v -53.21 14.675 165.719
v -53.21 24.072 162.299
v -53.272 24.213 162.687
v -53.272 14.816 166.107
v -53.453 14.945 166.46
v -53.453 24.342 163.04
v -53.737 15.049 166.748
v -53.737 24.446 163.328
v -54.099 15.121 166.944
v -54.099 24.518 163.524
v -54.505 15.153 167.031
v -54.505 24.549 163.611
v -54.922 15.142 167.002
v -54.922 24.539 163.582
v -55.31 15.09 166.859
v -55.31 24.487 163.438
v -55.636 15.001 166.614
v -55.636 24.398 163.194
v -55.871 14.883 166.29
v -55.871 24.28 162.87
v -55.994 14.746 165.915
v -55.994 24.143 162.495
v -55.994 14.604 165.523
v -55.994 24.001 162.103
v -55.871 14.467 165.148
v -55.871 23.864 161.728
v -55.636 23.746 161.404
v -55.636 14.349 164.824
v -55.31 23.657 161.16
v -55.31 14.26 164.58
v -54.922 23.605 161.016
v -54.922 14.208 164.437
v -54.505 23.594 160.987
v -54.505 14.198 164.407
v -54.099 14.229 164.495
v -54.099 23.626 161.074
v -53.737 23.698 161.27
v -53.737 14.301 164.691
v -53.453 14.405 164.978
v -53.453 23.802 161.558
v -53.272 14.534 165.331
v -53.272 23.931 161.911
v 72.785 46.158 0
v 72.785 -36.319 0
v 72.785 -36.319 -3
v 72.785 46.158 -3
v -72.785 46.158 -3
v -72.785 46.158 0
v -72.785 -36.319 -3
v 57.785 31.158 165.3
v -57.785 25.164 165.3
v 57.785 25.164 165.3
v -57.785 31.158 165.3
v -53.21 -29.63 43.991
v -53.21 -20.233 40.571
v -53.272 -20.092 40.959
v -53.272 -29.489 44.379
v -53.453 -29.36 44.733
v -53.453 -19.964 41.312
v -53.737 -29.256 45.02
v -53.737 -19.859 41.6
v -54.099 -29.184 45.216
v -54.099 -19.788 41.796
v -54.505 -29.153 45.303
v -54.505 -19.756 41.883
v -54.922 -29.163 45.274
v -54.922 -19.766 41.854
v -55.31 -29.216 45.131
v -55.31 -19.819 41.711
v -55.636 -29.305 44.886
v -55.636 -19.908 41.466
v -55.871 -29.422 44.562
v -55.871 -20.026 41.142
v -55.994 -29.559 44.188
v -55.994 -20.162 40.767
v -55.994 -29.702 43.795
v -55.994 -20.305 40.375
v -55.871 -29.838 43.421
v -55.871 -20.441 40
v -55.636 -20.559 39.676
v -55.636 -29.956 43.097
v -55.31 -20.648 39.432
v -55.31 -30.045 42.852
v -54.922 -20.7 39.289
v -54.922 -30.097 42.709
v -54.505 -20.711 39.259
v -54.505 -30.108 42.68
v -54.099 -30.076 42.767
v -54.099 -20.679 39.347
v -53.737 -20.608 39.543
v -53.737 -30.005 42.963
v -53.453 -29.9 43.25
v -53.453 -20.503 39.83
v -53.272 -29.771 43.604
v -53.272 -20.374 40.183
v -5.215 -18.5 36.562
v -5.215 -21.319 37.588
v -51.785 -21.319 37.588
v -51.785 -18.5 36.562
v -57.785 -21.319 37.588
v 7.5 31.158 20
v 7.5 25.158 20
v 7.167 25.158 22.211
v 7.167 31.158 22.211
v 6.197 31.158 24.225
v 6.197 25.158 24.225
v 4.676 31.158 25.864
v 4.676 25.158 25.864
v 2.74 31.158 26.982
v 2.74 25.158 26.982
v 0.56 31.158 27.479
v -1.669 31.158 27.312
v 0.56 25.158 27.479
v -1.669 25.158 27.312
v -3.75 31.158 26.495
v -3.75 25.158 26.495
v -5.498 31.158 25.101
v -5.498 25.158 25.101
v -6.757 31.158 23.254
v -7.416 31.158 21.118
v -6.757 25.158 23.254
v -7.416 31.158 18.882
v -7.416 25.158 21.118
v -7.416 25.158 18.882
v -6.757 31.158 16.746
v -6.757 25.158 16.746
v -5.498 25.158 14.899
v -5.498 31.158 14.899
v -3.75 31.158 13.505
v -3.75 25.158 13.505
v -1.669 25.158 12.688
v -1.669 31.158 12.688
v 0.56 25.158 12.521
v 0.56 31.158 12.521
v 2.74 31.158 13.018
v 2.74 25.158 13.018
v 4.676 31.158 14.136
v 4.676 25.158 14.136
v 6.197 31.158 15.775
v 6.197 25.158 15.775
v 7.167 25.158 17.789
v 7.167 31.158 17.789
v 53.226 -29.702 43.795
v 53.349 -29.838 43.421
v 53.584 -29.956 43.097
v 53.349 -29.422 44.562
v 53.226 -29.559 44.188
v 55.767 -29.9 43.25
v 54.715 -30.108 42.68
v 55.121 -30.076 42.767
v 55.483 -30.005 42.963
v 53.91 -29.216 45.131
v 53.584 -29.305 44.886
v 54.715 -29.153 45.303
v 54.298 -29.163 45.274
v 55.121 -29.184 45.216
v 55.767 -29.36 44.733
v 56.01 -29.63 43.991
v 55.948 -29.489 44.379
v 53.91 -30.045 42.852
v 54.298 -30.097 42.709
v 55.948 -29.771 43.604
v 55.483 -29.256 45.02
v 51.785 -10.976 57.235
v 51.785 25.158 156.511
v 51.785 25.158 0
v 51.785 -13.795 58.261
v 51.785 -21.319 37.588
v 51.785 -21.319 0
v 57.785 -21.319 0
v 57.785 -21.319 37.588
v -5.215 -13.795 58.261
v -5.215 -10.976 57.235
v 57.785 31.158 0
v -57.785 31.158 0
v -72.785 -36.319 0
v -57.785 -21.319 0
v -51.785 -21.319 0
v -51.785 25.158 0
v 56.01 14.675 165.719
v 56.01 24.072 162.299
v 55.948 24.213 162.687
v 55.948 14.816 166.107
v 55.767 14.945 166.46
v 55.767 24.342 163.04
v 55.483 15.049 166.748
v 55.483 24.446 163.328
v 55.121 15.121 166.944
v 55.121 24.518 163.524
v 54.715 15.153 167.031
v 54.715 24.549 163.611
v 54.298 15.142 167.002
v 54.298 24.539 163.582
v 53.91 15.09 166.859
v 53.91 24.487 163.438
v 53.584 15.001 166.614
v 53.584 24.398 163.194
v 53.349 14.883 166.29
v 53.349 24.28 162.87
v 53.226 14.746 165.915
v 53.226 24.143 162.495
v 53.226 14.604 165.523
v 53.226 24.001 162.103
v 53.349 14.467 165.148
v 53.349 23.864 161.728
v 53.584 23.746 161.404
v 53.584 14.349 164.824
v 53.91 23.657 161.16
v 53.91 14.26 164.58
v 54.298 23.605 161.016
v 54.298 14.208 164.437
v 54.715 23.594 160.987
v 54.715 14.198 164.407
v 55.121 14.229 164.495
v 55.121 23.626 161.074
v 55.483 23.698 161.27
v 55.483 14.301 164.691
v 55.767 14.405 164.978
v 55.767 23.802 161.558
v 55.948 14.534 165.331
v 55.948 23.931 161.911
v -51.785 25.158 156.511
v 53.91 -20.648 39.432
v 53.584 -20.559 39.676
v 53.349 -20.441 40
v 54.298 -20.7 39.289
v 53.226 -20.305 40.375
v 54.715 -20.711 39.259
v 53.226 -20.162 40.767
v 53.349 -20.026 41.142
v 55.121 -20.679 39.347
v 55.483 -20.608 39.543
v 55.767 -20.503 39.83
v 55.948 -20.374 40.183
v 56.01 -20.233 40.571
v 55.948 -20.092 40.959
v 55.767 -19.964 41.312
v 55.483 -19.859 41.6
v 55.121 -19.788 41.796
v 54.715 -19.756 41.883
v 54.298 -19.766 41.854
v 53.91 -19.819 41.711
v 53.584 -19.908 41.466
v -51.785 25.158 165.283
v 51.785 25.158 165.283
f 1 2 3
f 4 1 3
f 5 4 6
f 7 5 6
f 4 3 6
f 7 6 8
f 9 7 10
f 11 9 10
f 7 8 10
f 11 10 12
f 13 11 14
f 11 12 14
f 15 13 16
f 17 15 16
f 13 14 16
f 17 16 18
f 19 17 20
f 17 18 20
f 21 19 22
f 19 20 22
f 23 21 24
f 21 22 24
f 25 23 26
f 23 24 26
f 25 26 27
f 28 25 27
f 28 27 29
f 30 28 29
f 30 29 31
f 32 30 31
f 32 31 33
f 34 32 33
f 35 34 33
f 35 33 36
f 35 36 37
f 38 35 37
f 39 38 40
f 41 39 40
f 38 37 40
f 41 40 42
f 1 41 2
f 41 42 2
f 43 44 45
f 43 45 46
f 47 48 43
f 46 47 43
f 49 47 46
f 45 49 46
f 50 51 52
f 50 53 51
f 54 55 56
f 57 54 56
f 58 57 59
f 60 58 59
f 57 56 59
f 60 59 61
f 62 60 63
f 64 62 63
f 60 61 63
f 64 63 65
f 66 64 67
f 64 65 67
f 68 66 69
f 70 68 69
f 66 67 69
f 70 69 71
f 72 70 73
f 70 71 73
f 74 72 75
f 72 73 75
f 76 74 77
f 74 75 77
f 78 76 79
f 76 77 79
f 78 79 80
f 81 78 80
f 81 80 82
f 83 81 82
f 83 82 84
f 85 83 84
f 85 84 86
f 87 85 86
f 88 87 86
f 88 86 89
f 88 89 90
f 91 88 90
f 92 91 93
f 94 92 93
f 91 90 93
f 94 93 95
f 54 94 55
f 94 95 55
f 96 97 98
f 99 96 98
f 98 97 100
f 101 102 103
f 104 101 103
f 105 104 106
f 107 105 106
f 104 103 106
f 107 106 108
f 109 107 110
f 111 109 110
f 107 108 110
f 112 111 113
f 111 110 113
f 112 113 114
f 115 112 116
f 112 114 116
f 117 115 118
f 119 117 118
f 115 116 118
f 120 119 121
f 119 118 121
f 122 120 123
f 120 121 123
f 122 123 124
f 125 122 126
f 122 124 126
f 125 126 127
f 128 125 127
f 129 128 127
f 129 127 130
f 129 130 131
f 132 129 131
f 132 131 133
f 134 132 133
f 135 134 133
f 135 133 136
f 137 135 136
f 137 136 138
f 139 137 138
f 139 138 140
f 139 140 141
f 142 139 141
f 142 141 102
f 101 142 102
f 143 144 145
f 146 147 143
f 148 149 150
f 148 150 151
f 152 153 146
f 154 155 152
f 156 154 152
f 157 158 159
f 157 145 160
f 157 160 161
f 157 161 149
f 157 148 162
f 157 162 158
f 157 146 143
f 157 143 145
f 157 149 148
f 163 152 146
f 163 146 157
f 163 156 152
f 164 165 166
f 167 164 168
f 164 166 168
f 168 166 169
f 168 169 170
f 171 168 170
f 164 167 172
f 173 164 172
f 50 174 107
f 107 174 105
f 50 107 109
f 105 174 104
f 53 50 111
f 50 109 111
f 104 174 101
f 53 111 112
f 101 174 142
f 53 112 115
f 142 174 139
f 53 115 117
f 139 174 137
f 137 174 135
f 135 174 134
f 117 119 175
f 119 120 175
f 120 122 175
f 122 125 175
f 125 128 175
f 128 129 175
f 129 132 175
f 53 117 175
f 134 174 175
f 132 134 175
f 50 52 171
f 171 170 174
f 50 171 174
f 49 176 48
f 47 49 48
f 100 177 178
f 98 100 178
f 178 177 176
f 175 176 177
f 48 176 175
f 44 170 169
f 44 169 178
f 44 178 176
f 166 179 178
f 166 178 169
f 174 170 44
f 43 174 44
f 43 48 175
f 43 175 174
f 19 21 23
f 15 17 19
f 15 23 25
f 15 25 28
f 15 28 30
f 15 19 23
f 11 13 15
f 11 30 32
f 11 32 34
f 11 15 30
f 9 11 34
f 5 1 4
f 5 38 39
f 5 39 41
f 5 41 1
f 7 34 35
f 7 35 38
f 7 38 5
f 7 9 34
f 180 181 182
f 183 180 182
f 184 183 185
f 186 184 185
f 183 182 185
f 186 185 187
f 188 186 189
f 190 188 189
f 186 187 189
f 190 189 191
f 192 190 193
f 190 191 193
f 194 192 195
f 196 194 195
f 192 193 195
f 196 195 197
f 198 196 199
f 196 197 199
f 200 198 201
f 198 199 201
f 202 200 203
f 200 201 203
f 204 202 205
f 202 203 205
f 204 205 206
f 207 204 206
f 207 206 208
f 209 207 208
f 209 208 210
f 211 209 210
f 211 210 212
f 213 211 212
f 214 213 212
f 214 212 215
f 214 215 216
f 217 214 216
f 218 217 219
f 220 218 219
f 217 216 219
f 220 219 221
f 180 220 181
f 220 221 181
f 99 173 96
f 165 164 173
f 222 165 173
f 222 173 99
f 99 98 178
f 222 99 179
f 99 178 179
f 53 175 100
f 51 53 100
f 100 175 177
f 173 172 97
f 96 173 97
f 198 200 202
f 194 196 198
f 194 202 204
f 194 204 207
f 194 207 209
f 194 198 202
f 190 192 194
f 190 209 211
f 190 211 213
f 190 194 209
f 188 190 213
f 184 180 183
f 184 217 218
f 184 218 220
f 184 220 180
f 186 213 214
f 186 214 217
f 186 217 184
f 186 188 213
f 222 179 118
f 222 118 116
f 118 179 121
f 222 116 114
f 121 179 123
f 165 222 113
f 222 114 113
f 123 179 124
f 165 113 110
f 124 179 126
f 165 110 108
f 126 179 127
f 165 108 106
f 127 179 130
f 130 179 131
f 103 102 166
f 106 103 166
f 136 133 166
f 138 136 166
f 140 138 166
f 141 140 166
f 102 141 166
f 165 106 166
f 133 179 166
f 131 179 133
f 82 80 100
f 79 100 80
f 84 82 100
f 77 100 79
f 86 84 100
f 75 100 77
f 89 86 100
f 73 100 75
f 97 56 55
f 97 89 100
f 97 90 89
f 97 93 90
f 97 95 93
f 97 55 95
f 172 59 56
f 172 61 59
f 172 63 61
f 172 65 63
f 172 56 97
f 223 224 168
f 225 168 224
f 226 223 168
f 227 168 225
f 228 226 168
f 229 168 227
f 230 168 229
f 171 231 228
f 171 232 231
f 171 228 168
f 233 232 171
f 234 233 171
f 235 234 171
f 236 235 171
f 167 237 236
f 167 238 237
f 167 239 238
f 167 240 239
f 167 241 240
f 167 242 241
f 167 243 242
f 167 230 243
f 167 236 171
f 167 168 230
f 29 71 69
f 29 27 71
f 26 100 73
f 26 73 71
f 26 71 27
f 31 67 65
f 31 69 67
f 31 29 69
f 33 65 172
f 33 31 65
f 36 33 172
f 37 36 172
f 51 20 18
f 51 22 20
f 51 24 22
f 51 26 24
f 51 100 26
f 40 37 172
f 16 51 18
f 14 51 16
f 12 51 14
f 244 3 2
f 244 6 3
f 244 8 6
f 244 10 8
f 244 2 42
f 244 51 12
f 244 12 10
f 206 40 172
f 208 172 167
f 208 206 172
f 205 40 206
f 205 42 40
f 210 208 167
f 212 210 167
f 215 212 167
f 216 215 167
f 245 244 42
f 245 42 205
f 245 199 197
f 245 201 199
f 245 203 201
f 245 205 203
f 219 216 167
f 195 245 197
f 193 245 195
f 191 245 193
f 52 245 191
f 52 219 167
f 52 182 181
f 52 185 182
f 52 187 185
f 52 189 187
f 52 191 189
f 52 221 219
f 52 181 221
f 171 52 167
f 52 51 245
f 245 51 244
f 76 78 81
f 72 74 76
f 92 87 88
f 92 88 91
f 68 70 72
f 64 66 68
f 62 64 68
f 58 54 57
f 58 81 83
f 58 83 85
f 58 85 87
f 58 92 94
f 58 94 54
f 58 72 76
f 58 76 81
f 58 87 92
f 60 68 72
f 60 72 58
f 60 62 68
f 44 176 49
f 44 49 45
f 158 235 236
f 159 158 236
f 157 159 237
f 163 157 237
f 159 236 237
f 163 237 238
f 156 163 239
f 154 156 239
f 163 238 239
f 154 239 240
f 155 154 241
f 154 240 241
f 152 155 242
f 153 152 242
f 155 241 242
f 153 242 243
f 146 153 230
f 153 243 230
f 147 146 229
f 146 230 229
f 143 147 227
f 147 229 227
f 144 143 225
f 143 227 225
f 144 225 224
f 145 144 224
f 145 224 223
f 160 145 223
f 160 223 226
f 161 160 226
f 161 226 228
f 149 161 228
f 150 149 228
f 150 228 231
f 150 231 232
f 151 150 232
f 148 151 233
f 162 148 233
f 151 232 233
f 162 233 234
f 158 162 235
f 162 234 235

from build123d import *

# Parameters (mm, degrees)
SKETCH001_W     = 145.57
SKETCH001_H     = 82.477117
PAD_DEPTH       = 3
PAD001_DEPTH    = 165.3
SKETCH004_W     = 328.820023
SKETCH004_H     = 275.658927
POCKET_DEPTH    = 200
PAD002_DEPTH    = 3
SKETCH003_R     = 1.4
PAD003_DEPTH    = 10
SKETCH005_R     = 7.5
POCKET001_DEPTH = 46.158923


with BuildPart() as part:
    # Sketch001 → Pad (new body)
    with BuildSketch(Plane.XY):
        with Locations((0, 4.919365)):
            Rectangle(SKETCH001_W, SKETCH001_H)
    extrude(amount=-PAD_DEPTH)

    # Sketch → Pad001 (join)
    with BuildSketch(Plane.XY):
        Polygon((51.785, -21.319194), (57.785, -21.319194), (57.785, 31.157923), (-57.785, 31.157923), (-57.785, -21.319194), (-51.785, -21.319194), (-51.785, 25.157923), (51.785, 25.157923), align=None)
    extrude(amount=PAD001_DEPTH)

    # Sketch004 (on DatumPlane) → Pocket (cut)
    with BuildSketch(Plane(origin=(0, -35, 0), x_dir=(1, 0, 0), z_dir=(0, -0.939693, 0.34202))):
        with Locations((-2.626228, 137.829464)):
            Rectangle(SKETCH004_W, SKETCH004_H)
    extrude(amount=POCKET_DEPTH, mode=Mode.SUBTRACT)

    # Sketch002 (on DatumPlane) → Pad002 (join)
    with BuildSketch(Plane(origin=(0, -35, 0), x_dir=(1, 0, 0), z_dir=(0, -0.939693, 0.34202))):
        Polygon((-57.785, 175.89), (57.785, 175.89), (57.785, 40), (51.785, 40), (51.785, 62), (-5.215, 62), (-5.215, 40), (-57.785, 40), align=None)
    extrude(amount=-PAD002_DEPTH)

    # Sketch003 (on DatumPlane) → Pad003 (join)
    with BuildSketch(Plane(origin=(0, -35, 0), x_dir=(1, 0, 0), z_dir=(0, -0.939693, 0.34202))):
        with Locations((-54.61, 172.715)):
            Circle(SKETCH003_R)
        with Locations((54.61, 172.715)):
            Circle(SKETCH003_R)
        with Locations((54.61, 43.175)):
            Circle(SKETCH003_R)
        with Locations((-54.61, 43.175)):
            Circle(SKETCH003_R)
    extrude(amount=PAD003_DEPTH)

    # Sketch005 → Pocket001 (cut, through all)
    with BuildSketch(Plane.XZ):
        with Locations((0, 20)):
            Circle(SKETCH005_R)
    extrude(amount=-POCKET001_DEPTH, mode=Mode.SUBTRACT)


solid = part.part
